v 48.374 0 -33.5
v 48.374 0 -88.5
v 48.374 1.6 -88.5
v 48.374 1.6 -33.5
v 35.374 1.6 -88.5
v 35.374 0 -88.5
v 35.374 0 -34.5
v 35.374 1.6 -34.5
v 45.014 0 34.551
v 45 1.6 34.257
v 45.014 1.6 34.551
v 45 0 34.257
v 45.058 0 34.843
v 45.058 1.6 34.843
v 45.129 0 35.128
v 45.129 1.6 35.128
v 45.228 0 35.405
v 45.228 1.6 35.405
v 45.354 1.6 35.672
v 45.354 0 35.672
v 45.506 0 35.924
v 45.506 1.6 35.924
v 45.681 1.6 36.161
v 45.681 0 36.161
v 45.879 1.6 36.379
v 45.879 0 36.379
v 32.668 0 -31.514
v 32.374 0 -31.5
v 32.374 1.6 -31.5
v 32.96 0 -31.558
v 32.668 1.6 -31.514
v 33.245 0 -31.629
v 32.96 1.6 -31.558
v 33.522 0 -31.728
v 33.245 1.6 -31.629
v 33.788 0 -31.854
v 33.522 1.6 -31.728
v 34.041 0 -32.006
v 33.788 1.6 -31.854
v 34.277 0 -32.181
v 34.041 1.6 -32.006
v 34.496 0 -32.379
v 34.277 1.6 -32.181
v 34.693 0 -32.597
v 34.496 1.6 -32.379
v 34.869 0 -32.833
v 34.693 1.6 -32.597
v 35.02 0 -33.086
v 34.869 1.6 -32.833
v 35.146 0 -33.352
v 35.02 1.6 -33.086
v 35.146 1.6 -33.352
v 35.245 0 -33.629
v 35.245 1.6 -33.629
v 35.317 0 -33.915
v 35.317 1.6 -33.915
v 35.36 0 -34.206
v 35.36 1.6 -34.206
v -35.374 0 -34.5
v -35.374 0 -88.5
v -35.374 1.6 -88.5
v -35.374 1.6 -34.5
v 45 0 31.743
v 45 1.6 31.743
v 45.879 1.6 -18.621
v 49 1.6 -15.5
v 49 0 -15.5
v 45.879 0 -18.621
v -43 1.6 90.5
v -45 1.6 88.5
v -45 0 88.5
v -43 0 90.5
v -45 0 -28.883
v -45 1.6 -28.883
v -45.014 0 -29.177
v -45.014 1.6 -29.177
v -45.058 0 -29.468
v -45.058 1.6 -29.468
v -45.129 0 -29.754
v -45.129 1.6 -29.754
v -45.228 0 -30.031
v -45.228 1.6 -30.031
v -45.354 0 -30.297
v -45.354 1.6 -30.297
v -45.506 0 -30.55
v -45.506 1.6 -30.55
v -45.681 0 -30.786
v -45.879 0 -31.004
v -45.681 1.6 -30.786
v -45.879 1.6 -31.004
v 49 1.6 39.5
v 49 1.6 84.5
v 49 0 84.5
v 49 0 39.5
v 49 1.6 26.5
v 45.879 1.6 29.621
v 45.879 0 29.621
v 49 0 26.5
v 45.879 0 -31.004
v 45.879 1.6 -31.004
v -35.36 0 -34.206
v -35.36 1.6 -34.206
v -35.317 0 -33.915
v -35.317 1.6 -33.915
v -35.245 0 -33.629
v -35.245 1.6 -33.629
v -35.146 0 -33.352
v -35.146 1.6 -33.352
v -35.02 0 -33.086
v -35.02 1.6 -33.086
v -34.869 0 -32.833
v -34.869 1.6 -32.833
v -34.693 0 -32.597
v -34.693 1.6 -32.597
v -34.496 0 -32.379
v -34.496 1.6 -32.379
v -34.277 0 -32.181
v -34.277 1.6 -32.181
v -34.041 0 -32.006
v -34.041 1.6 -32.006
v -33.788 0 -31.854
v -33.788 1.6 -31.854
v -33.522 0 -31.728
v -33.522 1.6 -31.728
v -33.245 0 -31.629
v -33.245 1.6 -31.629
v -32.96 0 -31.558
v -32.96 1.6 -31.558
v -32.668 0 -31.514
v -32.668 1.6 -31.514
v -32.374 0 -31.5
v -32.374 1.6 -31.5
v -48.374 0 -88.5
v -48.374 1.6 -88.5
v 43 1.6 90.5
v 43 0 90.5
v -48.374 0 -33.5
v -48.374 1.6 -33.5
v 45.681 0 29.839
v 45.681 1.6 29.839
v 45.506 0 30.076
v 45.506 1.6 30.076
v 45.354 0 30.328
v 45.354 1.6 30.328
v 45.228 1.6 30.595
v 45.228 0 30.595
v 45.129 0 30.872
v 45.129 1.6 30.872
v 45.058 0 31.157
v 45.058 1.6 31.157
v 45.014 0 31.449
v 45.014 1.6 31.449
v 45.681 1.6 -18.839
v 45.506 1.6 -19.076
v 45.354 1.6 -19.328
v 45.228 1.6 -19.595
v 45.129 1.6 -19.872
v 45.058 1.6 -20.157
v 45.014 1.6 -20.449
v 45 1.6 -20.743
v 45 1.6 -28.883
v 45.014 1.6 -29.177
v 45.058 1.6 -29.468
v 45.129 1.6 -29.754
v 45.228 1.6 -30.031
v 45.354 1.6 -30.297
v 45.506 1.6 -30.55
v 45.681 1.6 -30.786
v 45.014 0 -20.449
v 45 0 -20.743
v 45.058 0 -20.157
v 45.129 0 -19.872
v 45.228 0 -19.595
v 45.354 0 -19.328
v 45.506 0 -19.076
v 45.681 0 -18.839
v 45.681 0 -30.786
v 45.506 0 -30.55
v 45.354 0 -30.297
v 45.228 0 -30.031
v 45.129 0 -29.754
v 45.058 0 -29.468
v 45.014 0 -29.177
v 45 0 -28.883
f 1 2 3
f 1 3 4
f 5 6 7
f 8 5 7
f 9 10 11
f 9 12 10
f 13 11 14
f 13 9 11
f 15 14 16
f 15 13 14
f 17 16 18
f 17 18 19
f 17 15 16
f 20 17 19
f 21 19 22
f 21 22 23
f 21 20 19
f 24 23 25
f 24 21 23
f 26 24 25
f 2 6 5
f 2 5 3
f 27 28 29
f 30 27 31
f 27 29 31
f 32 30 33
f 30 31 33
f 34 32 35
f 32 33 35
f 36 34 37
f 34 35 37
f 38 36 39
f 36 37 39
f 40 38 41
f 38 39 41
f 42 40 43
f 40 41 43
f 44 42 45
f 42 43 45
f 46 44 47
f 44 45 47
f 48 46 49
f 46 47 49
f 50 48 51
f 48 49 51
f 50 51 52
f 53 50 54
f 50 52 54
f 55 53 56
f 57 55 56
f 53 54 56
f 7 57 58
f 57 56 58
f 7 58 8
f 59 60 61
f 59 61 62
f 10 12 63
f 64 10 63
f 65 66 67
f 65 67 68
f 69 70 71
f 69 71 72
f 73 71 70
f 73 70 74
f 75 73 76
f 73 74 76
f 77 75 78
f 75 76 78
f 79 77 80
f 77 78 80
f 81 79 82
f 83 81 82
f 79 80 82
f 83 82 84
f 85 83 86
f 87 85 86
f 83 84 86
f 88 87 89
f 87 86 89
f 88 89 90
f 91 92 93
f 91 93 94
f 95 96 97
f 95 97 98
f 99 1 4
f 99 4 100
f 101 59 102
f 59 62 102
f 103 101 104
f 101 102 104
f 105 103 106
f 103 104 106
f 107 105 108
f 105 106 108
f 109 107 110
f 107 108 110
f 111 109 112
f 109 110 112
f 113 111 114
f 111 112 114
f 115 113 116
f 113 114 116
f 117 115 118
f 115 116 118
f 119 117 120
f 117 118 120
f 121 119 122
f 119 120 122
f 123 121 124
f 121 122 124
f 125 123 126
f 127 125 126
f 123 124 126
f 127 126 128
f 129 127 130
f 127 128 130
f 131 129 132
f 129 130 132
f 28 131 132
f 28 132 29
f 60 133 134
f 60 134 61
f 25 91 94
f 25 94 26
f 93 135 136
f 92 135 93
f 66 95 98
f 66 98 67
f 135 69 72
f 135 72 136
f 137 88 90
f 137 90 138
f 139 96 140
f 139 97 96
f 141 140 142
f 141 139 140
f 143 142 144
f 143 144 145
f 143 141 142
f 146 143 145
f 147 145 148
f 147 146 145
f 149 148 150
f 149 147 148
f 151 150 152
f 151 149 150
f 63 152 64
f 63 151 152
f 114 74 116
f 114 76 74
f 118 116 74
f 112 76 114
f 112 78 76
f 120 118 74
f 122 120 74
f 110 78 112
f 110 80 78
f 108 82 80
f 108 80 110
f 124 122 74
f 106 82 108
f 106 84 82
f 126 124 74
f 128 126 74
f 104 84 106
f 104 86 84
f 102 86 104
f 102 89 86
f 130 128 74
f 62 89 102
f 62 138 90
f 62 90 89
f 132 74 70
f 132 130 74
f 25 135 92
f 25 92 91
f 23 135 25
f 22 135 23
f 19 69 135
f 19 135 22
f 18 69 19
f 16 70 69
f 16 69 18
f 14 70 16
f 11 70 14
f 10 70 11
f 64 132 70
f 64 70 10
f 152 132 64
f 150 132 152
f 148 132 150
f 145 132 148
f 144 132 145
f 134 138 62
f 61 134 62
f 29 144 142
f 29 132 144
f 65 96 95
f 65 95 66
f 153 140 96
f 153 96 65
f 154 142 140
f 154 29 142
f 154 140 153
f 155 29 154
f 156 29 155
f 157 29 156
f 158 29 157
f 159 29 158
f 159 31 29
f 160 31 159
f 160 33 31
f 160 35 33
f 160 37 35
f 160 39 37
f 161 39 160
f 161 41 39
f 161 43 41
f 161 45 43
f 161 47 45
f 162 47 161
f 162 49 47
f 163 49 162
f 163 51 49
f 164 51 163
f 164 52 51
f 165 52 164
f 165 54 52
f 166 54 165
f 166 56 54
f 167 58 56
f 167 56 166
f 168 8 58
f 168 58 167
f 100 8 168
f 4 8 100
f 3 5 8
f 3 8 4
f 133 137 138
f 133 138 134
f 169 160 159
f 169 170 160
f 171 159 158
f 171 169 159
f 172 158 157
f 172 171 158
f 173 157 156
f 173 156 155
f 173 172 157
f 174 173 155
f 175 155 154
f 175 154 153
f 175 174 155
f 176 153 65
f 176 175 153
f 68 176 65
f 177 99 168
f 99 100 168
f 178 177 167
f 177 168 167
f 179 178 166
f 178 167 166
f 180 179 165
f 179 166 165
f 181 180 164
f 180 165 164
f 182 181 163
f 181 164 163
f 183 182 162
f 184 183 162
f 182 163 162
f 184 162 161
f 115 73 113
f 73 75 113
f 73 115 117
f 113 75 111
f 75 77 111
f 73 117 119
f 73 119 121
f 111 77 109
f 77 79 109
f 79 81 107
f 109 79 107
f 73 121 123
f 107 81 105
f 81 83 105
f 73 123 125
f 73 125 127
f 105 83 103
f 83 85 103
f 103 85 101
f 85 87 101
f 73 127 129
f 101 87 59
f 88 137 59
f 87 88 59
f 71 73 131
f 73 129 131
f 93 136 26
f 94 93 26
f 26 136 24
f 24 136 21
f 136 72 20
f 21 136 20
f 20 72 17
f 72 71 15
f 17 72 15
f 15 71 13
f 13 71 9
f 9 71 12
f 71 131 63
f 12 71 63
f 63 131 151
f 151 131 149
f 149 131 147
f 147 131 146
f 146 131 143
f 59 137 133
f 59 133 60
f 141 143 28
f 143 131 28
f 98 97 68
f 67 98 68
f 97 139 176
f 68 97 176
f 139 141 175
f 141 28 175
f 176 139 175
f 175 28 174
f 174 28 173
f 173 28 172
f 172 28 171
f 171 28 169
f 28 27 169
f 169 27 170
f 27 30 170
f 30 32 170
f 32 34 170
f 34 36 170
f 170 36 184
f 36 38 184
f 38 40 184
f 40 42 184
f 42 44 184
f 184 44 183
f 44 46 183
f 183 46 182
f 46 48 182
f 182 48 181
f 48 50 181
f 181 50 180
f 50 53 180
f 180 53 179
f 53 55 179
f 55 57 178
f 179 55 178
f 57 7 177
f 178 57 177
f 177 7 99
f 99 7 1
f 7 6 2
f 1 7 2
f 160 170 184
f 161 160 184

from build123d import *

# Parameters (mm, degrees)
SKETCH1_W           = 90
SKETCH1_H           = 177
BOSS_EXTRUDE1_DEPTH = 1.6
BOSS_EXTRUDE4_DEPTH = 1.6
BOSS_EXTRUDE5_DEPTH = 1.6
SKETCH9_W           = 70.7486
SKETCH9_H           = 57
CUT_EXTRUDE3_DEPTH  = 2.6
FILLET1_R           = 3


with BuildPart() as part:
    # Sketch1 → Boss-Extrude1 (new body)
    with BuildSketch(Plane(origin=(0, 0, 0), x_dir=(1, 0, 0), z_dir=(0, 1, 0))):
        Rectangle(SKETCH1_W, SKETCH1_H)
    extrude(amount=BOSS_EXTRUDE1_DEPTH)

    # Sketch7 → Boss-Extrude4 (add)
    with BuildSketch(Plane.XZ):
        Polygon((-45, -88.5), (-45, -30.1257), (-48.3743, -33.5), (-48.3743, -88.5), align=None)
        Polygon((45, -30.1257), (45, -88.5), (48.3743, -88.5), (48.3743, -33.5), align=None)
    extrude(amount=-BOSS_EXTRUDE4_DEPTH)

    # Sketch w → Boss-Extrude5 (add)
    with BuildSketch(Plane(origin=(0, 1.6, 0), x_dir=(1, 0, 0), z_dir=(0, 1, 0))):
        Polygon((-43, -90.5), (43, -90.5), (45, -88.5), (-45, -88.5), align=None)
        Polygon((45, -35.5), (45, -88.5), (49, -84.5), (49, -39.5), align=None)
        Polygon((45, 19.5), (45, -30.5), (49, -26.5), (49, 15.5), align=None)
    extrude(amount=-BOSS_EXTRUDE5_DEPTH)

    # Sketch9 → Cut-Extrude3 (cut, through all)
    with BuildSketch(Plane.XZ):
        with Locations((0, -60)):
            Rectangle(SKETCH9_W, SKETCH9_H)
    extrude(amount=-CUT_EXTRUDE3_DEPTH, mode=Mode.SUBTRACT)

    # Fillet1
    fillet1_edges = [part.edges().sort_by_distance(p)[0] for p in [
        (-45, 0.8, -30.1257),
        (45, 0.8, -30.1257),
        (45, 0.8, 35.5),
        (45, 0.8, 30.5),
        (45, 0.8, -19.5),
        (-35.3743, 0.8, -31.5),
        (35.3743, 0.8, -31.5),
    ]]
    fillet(fillet1_edges, radius=FILLET1_R)


solid = part.part
